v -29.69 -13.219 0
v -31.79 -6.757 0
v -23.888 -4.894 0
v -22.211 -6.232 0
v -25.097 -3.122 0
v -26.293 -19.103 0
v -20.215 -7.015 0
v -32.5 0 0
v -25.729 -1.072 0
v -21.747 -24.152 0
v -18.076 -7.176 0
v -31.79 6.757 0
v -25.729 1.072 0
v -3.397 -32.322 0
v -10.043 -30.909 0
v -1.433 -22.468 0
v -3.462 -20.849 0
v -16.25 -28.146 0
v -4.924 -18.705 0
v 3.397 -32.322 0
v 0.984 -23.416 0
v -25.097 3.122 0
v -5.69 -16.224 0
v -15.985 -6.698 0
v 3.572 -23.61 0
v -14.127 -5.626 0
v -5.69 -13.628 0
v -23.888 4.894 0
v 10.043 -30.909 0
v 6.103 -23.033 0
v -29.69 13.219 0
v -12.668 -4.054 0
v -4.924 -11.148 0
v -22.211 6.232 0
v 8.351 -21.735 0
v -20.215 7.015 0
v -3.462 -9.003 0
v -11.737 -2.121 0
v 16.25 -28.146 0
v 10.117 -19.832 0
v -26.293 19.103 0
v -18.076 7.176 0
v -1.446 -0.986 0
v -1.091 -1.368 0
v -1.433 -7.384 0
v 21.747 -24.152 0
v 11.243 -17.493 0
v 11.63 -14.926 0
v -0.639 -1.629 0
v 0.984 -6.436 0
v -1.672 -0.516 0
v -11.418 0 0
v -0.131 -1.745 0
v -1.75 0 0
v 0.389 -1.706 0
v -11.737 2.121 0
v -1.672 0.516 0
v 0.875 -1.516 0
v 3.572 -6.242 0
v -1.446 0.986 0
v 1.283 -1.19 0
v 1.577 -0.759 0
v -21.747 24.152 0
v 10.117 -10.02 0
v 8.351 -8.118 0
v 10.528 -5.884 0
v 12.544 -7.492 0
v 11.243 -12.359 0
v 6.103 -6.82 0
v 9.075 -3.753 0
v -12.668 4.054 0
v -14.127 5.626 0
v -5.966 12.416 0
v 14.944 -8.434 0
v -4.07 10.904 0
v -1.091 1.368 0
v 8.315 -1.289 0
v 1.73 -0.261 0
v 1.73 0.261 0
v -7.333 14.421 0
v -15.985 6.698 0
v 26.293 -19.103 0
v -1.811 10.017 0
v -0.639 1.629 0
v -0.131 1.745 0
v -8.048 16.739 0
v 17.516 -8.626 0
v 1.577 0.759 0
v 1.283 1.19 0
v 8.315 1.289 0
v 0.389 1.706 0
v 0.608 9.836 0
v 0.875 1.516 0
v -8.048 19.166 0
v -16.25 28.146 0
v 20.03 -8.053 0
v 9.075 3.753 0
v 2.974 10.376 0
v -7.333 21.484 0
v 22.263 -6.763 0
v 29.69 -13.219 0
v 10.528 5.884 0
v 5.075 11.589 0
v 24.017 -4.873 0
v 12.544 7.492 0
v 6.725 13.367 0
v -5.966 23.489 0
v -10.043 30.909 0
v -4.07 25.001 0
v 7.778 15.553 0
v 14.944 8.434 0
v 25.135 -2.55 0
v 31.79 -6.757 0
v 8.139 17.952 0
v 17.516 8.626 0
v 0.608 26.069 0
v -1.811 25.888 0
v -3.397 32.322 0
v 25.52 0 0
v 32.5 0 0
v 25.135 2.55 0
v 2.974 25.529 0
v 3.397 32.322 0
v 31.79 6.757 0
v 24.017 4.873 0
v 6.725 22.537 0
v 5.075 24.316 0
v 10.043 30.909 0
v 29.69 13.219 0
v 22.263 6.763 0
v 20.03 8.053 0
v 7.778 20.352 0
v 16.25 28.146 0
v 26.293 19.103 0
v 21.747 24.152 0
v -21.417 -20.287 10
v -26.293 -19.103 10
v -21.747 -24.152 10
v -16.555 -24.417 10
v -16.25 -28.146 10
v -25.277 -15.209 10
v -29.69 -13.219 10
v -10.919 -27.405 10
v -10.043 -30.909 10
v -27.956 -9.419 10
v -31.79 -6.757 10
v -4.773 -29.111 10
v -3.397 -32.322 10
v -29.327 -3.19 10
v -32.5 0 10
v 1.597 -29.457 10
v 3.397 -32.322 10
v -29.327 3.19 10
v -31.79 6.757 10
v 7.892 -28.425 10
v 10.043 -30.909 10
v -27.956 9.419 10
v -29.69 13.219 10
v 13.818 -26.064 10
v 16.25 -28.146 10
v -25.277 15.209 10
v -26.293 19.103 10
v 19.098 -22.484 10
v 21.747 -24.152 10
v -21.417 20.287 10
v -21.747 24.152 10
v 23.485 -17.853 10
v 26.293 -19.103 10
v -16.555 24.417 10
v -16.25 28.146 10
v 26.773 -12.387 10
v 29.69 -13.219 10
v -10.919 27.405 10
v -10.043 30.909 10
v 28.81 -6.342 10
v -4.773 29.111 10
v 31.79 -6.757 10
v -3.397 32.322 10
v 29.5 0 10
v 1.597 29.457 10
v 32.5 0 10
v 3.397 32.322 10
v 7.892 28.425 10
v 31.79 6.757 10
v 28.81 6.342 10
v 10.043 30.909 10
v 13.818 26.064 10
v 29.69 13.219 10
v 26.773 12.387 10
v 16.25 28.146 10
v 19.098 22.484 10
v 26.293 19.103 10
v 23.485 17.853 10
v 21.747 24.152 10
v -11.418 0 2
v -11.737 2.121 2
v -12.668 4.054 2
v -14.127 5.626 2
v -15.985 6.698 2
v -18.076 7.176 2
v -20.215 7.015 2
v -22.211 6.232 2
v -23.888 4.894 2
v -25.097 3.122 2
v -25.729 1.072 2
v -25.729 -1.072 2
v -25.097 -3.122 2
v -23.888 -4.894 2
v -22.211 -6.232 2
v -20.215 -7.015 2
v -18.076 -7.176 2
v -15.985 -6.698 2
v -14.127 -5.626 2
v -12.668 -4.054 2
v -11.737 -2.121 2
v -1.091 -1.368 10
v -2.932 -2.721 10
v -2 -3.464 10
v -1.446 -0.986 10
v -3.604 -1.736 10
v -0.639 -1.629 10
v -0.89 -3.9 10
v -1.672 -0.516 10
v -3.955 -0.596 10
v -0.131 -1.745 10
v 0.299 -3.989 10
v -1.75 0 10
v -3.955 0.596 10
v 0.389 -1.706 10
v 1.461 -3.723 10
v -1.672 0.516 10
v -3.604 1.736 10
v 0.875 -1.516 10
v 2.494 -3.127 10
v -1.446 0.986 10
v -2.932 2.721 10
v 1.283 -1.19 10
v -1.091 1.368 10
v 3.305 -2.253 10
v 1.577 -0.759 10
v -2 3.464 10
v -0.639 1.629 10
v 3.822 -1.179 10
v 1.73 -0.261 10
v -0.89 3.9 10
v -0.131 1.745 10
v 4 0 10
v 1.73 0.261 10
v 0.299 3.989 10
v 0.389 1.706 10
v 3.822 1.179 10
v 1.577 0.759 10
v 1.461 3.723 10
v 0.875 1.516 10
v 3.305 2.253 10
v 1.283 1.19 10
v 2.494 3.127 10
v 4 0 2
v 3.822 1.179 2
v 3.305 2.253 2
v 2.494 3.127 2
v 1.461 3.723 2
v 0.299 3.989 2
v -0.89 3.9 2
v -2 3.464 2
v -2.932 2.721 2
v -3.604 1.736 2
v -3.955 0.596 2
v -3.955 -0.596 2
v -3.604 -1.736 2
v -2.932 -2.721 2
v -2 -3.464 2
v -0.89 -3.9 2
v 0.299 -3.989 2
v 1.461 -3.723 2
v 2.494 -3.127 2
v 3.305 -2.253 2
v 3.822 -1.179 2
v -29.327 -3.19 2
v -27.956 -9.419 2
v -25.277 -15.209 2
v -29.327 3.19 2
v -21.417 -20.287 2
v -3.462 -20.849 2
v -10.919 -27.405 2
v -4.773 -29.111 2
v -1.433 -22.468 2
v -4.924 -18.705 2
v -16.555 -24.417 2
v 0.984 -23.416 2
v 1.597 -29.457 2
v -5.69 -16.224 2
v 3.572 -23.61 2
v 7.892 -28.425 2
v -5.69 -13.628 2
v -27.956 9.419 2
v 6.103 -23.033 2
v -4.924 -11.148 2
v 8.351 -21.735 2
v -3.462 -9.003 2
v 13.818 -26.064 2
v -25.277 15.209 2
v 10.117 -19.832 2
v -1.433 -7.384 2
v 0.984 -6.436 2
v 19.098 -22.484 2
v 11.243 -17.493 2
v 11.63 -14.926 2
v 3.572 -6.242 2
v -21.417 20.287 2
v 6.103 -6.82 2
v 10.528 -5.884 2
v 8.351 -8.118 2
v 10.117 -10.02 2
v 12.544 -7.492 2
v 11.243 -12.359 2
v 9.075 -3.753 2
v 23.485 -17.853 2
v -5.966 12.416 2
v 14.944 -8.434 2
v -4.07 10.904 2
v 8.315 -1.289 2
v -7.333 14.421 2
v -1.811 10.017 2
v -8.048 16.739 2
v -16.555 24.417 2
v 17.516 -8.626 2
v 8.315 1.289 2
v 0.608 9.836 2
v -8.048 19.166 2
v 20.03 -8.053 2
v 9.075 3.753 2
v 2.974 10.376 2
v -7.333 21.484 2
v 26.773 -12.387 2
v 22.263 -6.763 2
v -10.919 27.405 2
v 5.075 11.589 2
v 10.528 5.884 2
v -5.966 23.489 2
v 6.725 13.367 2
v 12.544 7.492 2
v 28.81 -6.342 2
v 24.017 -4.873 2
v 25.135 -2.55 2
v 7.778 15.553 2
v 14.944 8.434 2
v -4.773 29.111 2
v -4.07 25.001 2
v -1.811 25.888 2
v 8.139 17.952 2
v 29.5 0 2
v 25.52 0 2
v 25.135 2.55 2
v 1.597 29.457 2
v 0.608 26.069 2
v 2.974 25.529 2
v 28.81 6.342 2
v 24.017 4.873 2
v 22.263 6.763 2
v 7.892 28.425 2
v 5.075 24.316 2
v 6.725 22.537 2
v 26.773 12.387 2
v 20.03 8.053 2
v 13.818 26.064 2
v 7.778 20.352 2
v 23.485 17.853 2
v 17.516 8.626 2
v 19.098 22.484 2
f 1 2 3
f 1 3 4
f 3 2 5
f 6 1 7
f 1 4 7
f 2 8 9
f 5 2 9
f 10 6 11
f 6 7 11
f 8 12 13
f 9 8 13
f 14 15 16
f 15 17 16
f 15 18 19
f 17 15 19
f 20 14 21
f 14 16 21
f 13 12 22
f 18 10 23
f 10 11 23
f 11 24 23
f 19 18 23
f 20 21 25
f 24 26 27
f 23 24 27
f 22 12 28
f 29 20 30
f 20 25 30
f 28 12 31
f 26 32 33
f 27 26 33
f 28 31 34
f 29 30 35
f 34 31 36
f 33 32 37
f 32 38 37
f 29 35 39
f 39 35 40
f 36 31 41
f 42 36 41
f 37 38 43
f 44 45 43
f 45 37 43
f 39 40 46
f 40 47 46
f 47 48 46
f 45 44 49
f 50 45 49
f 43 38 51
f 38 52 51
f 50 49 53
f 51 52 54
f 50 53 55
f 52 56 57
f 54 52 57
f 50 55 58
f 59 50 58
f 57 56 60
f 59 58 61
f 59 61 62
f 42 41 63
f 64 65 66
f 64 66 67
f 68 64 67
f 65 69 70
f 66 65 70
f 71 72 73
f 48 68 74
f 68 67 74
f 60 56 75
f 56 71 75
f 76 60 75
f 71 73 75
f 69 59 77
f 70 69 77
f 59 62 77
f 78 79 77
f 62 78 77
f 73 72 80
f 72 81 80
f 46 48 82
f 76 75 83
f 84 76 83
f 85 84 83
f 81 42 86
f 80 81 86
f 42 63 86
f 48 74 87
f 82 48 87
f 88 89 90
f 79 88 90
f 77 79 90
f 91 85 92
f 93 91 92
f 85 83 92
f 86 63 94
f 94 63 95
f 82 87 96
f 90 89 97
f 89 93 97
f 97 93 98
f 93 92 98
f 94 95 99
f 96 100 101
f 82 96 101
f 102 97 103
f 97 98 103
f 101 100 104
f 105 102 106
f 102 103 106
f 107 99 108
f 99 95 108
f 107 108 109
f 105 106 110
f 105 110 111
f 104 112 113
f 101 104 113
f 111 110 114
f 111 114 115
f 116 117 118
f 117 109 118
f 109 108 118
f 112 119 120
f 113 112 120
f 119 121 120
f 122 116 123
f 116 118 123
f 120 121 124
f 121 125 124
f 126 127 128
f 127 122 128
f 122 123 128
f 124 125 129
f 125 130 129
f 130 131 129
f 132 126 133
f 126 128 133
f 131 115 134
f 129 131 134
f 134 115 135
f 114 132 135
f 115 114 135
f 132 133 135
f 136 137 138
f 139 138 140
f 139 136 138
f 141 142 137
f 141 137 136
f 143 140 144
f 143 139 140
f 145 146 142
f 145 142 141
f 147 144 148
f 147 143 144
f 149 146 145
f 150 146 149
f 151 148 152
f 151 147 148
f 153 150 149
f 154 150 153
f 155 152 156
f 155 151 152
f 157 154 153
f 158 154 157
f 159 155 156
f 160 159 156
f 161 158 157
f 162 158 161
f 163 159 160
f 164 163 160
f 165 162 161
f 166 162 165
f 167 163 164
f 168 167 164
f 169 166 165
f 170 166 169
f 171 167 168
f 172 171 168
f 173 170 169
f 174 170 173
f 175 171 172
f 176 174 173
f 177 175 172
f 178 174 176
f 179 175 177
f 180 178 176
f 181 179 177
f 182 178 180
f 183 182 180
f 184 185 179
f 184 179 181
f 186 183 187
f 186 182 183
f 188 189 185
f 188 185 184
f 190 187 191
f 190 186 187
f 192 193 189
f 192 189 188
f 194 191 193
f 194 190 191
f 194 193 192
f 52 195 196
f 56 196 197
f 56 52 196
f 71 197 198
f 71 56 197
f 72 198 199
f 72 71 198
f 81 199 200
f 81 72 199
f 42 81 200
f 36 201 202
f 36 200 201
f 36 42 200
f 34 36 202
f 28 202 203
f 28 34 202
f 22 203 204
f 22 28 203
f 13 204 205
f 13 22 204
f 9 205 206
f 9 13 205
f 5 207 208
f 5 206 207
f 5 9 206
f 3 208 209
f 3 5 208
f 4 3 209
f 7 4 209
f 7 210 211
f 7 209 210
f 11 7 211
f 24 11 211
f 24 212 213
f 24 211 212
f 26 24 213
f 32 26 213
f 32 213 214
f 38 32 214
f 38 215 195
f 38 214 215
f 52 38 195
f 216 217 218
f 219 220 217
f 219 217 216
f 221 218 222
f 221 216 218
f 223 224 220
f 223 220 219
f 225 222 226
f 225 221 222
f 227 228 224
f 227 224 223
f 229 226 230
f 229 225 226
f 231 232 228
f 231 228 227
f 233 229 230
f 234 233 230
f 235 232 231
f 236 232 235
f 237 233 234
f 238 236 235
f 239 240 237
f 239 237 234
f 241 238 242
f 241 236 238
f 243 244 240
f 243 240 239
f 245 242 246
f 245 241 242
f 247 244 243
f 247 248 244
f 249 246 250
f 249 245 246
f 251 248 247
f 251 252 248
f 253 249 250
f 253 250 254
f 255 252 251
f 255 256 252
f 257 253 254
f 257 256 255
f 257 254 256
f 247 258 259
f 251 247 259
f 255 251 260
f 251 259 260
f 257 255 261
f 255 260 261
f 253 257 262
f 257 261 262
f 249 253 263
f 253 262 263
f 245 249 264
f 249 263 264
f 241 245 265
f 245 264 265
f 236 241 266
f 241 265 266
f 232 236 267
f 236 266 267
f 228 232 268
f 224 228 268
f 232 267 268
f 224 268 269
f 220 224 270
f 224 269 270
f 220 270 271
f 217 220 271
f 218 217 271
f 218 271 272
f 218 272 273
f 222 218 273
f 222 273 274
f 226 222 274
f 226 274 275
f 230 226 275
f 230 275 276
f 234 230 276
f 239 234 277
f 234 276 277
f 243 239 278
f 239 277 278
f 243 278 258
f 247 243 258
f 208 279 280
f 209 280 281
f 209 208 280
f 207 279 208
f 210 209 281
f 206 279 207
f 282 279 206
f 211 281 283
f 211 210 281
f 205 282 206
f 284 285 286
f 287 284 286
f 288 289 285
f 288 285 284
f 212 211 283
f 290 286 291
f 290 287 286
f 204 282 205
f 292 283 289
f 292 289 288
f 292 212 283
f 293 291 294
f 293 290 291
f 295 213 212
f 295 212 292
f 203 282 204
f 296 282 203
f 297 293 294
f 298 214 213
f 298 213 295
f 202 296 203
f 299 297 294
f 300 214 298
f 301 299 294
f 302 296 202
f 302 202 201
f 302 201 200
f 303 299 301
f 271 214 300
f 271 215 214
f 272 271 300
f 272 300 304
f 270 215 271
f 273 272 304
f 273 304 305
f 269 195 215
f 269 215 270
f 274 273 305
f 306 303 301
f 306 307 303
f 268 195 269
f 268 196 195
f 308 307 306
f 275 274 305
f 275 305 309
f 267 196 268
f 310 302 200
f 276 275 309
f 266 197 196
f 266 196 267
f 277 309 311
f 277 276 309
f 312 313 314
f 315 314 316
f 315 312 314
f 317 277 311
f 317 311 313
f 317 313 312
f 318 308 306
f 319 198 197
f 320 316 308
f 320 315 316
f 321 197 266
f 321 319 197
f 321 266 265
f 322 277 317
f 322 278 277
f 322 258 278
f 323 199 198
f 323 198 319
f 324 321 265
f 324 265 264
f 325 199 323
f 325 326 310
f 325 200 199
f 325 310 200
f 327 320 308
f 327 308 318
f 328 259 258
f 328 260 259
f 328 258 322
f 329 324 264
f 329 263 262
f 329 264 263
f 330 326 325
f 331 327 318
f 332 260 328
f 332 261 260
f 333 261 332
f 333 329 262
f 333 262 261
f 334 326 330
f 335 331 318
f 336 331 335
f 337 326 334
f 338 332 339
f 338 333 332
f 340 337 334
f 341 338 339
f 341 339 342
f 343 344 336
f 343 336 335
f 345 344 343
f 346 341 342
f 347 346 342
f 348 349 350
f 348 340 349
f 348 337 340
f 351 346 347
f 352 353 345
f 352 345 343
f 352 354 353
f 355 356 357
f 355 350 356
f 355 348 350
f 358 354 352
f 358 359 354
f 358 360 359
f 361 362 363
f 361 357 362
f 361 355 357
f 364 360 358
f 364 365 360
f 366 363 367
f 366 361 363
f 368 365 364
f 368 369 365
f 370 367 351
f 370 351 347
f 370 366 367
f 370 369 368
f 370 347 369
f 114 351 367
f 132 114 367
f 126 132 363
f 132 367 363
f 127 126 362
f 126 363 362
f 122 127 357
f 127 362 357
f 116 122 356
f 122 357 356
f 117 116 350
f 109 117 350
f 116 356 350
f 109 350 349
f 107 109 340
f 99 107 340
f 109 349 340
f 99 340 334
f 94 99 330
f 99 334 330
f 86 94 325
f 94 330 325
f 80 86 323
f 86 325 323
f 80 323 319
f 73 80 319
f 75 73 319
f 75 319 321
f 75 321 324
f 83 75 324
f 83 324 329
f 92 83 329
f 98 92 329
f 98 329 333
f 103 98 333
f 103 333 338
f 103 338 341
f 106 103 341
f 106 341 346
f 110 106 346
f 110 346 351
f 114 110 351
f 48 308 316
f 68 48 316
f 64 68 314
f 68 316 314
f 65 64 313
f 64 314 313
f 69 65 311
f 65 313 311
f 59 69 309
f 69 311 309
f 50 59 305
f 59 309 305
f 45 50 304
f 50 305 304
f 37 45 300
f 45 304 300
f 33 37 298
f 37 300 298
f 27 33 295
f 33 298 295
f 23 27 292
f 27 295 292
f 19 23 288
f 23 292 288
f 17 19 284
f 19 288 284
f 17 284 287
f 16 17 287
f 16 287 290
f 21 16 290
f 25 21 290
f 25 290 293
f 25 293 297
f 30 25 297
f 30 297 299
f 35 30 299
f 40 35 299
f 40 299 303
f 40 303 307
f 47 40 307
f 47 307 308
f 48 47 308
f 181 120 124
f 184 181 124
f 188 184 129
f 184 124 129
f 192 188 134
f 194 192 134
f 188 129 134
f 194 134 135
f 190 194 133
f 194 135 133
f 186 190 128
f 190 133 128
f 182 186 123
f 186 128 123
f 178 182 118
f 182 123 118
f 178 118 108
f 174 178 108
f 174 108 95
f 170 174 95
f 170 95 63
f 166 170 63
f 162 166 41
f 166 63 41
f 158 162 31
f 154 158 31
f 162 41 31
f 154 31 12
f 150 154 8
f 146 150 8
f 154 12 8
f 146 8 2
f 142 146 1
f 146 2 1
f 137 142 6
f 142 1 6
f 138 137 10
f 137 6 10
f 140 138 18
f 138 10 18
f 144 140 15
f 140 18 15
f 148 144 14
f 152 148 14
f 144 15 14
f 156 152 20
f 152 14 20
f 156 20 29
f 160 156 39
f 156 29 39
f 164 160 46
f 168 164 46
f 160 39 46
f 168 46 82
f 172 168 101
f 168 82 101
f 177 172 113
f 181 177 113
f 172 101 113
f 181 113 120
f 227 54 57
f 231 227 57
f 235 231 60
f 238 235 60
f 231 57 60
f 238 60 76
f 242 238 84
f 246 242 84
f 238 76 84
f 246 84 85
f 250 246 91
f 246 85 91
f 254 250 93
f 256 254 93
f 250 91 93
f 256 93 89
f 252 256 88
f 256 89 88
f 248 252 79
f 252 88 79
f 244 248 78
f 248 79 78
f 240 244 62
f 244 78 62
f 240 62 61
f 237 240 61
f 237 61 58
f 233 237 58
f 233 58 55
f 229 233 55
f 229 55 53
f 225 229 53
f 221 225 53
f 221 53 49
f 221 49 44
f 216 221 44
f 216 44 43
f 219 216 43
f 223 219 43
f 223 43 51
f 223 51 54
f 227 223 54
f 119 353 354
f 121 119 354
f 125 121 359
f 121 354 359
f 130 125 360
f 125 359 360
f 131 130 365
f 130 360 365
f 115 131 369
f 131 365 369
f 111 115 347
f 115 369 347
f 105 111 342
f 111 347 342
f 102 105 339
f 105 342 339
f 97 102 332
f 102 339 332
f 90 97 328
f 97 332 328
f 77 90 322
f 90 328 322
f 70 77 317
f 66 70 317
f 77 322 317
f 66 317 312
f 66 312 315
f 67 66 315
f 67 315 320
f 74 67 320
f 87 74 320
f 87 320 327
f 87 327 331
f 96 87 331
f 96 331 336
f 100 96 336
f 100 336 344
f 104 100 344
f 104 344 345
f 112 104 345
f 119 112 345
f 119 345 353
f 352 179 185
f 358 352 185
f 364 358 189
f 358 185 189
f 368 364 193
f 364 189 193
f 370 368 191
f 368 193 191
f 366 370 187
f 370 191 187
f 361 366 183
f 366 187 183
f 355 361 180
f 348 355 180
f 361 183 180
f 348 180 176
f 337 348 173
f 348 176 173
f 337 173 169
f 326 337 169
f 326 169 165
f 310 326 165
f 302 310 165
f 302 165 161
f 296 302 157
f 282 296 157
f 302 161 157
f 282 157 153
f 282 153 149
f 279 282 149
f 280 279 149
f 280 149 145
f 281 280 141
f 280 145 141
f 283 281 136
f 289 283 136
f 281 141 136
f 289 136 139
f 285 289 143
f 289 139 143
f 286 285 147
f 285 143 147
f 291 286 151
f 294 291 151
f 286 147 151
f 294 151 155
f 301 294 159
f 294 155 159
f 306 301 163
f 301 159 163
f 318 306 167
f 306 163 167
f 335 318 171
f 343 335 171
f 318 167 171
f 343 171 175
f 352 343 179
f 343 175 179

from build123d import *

# Parameters (mm, degrees)
F0_R      = 32.5
F1_DEPTH  = 10
F2_R      = 29.5
F3_DEPTH  = 8
F4_R      = 4
F5_DEPTH  = 8
F7_D      = 3.5
F9_R      = 7.586322
F10_DEPTH = 25
F11_R     = 7.195806
F12_DEPTH = 8
F13_R     = 8.139218
F14_DEPTH = 8
F15_R     = 9.181934
F16_DEPTH = 8
F17_R     = 9.467051
F18_DEPTH = 8
F19_R     = 8.617722
F20_DEPTH = 8
F21_R     = 8.650571
F22_DEPTH = 8
F23_R     = 7.543209
F24_DEPTH = 2
F25_R     = 9.251874
F26_DEPTH = 2
F27_R     = 9.863577
F28_DEPTH = 2
F29_R     = 8.708559
F30_DEPTH = 25


with BuildPart() as f1:
    # F0 (on Top) → F1 (new body)
    with BuildSketch(Plane.XY):
        Circle(F0_R)
    extrude(amount=F1_DEPTH)

    # F2 (on face) → F3 (cut)
    with BuildSketch(Plane.XY.offset(10)):
        Circle(F2_R)
    extrude(amount=-F3_DEPTH, mode=Mode.SUBTRACT)

    # F4 (on face) → F5 (join)
    with BuildSketch(Plane.XY.offset(2)):
        Circle(F4_R)
    extrude(amount=F5_DEPTH)

    # F7 (through all)
    with Locations(Plane.XY.offset(10)):
        with Locations((0, 0)):
            Hole(F7_D / 2)

    # F9 (on Top) → F10 (cut)
    with BuildSketch(Plane.XY):
        with Locations((-17.948439, -5.982571)):
            Circle(F9_R)
    extrude(amount=-F10_DEPTH, mode=Mode.SUBTRACT)

    # F11 (on Top) → F12 (cut)
    with BuildSketch(Plane.XY):
        with Locations((-18.613562, 0)):
            Circle(F11_R)
    extrude(amount=F12_DEPTH, mode=Mode.SUBTRACT)

    # F13 (on face) → F14 (cut)
    with BuildSketch(Plane.XY.offset(2)):
        with Locations((0, 17.952453)):
            Circle(F13_R)
    extrude(amount=-F14_DEPTH, mode=Mode.SUBTRACT)

    # F15 (on Top) → F16 (cut)
    with BuildSketch(Plane.XY):
        with Locations((-3.715688, -14.254572)):
            Circle(F15_R)
    extrude(amount=-F16_DEPTH, mode=Mode.SUBTRACT)

    # F17 (on Top) → F18 (cut)
    with BuildSketch(Plane.XY):
        with Locations((0, -15.324812)):
            Circle(F17_R)
    extrude(amount=-F18_DEPTH, mode=Mode.SUBTRACT)

    # F19 (on Top) → F20 (cut)
    with BuildSketch(Plane.XY):
        with Locations((15.627168, 0)):
            Circle(F19_R)
    extrude(amount=-F20_DEPTH, mode=Mode.SUBTRACT)

    # F21 (on face) → F22 (cut)
    with BuildSketch(Plane.XY.offset(2)):
        with Locations((16.869104, 0)):
            Circle(F21_R)
    extrude(amount=-F22_DEPTH, mode=Mode.SUBTRACT)

    # F23 (on face) → F24 (join)
    with BuildSketch(Plane.XY.offset(2)):
        with Locations((-4.684343, -11.25865)):
            Circle(F23_R)
    extrude(amount=-F24_DEPTH)

    # F25 (on face) → F26 (join)
    with BuildSketch(Plane.XY.offset(2)):
        with Locations((0, -16.615551)):
            Circle(F25_R)
    extrude(amount=-F26_DEPTH)

    # F27 (on face) → F28 (join)
    with BuildSketch(Plane.XY.offset(2)):
        with Locations((-4.199367, -15.142487)):
            Circle(F27_R)
    extrude(amount=-F28_DEPTH)

    # F29 (on face) → F30 (cut)
    with BuildSketch(Plane.XY.offset(2)):
        with Locations((2.921705, -14.926143)):
            Circle(F29_R)
    extrude(amount=-F30_DEPTH, mode=Mode.SUBTRACT)


solid = f1.part
